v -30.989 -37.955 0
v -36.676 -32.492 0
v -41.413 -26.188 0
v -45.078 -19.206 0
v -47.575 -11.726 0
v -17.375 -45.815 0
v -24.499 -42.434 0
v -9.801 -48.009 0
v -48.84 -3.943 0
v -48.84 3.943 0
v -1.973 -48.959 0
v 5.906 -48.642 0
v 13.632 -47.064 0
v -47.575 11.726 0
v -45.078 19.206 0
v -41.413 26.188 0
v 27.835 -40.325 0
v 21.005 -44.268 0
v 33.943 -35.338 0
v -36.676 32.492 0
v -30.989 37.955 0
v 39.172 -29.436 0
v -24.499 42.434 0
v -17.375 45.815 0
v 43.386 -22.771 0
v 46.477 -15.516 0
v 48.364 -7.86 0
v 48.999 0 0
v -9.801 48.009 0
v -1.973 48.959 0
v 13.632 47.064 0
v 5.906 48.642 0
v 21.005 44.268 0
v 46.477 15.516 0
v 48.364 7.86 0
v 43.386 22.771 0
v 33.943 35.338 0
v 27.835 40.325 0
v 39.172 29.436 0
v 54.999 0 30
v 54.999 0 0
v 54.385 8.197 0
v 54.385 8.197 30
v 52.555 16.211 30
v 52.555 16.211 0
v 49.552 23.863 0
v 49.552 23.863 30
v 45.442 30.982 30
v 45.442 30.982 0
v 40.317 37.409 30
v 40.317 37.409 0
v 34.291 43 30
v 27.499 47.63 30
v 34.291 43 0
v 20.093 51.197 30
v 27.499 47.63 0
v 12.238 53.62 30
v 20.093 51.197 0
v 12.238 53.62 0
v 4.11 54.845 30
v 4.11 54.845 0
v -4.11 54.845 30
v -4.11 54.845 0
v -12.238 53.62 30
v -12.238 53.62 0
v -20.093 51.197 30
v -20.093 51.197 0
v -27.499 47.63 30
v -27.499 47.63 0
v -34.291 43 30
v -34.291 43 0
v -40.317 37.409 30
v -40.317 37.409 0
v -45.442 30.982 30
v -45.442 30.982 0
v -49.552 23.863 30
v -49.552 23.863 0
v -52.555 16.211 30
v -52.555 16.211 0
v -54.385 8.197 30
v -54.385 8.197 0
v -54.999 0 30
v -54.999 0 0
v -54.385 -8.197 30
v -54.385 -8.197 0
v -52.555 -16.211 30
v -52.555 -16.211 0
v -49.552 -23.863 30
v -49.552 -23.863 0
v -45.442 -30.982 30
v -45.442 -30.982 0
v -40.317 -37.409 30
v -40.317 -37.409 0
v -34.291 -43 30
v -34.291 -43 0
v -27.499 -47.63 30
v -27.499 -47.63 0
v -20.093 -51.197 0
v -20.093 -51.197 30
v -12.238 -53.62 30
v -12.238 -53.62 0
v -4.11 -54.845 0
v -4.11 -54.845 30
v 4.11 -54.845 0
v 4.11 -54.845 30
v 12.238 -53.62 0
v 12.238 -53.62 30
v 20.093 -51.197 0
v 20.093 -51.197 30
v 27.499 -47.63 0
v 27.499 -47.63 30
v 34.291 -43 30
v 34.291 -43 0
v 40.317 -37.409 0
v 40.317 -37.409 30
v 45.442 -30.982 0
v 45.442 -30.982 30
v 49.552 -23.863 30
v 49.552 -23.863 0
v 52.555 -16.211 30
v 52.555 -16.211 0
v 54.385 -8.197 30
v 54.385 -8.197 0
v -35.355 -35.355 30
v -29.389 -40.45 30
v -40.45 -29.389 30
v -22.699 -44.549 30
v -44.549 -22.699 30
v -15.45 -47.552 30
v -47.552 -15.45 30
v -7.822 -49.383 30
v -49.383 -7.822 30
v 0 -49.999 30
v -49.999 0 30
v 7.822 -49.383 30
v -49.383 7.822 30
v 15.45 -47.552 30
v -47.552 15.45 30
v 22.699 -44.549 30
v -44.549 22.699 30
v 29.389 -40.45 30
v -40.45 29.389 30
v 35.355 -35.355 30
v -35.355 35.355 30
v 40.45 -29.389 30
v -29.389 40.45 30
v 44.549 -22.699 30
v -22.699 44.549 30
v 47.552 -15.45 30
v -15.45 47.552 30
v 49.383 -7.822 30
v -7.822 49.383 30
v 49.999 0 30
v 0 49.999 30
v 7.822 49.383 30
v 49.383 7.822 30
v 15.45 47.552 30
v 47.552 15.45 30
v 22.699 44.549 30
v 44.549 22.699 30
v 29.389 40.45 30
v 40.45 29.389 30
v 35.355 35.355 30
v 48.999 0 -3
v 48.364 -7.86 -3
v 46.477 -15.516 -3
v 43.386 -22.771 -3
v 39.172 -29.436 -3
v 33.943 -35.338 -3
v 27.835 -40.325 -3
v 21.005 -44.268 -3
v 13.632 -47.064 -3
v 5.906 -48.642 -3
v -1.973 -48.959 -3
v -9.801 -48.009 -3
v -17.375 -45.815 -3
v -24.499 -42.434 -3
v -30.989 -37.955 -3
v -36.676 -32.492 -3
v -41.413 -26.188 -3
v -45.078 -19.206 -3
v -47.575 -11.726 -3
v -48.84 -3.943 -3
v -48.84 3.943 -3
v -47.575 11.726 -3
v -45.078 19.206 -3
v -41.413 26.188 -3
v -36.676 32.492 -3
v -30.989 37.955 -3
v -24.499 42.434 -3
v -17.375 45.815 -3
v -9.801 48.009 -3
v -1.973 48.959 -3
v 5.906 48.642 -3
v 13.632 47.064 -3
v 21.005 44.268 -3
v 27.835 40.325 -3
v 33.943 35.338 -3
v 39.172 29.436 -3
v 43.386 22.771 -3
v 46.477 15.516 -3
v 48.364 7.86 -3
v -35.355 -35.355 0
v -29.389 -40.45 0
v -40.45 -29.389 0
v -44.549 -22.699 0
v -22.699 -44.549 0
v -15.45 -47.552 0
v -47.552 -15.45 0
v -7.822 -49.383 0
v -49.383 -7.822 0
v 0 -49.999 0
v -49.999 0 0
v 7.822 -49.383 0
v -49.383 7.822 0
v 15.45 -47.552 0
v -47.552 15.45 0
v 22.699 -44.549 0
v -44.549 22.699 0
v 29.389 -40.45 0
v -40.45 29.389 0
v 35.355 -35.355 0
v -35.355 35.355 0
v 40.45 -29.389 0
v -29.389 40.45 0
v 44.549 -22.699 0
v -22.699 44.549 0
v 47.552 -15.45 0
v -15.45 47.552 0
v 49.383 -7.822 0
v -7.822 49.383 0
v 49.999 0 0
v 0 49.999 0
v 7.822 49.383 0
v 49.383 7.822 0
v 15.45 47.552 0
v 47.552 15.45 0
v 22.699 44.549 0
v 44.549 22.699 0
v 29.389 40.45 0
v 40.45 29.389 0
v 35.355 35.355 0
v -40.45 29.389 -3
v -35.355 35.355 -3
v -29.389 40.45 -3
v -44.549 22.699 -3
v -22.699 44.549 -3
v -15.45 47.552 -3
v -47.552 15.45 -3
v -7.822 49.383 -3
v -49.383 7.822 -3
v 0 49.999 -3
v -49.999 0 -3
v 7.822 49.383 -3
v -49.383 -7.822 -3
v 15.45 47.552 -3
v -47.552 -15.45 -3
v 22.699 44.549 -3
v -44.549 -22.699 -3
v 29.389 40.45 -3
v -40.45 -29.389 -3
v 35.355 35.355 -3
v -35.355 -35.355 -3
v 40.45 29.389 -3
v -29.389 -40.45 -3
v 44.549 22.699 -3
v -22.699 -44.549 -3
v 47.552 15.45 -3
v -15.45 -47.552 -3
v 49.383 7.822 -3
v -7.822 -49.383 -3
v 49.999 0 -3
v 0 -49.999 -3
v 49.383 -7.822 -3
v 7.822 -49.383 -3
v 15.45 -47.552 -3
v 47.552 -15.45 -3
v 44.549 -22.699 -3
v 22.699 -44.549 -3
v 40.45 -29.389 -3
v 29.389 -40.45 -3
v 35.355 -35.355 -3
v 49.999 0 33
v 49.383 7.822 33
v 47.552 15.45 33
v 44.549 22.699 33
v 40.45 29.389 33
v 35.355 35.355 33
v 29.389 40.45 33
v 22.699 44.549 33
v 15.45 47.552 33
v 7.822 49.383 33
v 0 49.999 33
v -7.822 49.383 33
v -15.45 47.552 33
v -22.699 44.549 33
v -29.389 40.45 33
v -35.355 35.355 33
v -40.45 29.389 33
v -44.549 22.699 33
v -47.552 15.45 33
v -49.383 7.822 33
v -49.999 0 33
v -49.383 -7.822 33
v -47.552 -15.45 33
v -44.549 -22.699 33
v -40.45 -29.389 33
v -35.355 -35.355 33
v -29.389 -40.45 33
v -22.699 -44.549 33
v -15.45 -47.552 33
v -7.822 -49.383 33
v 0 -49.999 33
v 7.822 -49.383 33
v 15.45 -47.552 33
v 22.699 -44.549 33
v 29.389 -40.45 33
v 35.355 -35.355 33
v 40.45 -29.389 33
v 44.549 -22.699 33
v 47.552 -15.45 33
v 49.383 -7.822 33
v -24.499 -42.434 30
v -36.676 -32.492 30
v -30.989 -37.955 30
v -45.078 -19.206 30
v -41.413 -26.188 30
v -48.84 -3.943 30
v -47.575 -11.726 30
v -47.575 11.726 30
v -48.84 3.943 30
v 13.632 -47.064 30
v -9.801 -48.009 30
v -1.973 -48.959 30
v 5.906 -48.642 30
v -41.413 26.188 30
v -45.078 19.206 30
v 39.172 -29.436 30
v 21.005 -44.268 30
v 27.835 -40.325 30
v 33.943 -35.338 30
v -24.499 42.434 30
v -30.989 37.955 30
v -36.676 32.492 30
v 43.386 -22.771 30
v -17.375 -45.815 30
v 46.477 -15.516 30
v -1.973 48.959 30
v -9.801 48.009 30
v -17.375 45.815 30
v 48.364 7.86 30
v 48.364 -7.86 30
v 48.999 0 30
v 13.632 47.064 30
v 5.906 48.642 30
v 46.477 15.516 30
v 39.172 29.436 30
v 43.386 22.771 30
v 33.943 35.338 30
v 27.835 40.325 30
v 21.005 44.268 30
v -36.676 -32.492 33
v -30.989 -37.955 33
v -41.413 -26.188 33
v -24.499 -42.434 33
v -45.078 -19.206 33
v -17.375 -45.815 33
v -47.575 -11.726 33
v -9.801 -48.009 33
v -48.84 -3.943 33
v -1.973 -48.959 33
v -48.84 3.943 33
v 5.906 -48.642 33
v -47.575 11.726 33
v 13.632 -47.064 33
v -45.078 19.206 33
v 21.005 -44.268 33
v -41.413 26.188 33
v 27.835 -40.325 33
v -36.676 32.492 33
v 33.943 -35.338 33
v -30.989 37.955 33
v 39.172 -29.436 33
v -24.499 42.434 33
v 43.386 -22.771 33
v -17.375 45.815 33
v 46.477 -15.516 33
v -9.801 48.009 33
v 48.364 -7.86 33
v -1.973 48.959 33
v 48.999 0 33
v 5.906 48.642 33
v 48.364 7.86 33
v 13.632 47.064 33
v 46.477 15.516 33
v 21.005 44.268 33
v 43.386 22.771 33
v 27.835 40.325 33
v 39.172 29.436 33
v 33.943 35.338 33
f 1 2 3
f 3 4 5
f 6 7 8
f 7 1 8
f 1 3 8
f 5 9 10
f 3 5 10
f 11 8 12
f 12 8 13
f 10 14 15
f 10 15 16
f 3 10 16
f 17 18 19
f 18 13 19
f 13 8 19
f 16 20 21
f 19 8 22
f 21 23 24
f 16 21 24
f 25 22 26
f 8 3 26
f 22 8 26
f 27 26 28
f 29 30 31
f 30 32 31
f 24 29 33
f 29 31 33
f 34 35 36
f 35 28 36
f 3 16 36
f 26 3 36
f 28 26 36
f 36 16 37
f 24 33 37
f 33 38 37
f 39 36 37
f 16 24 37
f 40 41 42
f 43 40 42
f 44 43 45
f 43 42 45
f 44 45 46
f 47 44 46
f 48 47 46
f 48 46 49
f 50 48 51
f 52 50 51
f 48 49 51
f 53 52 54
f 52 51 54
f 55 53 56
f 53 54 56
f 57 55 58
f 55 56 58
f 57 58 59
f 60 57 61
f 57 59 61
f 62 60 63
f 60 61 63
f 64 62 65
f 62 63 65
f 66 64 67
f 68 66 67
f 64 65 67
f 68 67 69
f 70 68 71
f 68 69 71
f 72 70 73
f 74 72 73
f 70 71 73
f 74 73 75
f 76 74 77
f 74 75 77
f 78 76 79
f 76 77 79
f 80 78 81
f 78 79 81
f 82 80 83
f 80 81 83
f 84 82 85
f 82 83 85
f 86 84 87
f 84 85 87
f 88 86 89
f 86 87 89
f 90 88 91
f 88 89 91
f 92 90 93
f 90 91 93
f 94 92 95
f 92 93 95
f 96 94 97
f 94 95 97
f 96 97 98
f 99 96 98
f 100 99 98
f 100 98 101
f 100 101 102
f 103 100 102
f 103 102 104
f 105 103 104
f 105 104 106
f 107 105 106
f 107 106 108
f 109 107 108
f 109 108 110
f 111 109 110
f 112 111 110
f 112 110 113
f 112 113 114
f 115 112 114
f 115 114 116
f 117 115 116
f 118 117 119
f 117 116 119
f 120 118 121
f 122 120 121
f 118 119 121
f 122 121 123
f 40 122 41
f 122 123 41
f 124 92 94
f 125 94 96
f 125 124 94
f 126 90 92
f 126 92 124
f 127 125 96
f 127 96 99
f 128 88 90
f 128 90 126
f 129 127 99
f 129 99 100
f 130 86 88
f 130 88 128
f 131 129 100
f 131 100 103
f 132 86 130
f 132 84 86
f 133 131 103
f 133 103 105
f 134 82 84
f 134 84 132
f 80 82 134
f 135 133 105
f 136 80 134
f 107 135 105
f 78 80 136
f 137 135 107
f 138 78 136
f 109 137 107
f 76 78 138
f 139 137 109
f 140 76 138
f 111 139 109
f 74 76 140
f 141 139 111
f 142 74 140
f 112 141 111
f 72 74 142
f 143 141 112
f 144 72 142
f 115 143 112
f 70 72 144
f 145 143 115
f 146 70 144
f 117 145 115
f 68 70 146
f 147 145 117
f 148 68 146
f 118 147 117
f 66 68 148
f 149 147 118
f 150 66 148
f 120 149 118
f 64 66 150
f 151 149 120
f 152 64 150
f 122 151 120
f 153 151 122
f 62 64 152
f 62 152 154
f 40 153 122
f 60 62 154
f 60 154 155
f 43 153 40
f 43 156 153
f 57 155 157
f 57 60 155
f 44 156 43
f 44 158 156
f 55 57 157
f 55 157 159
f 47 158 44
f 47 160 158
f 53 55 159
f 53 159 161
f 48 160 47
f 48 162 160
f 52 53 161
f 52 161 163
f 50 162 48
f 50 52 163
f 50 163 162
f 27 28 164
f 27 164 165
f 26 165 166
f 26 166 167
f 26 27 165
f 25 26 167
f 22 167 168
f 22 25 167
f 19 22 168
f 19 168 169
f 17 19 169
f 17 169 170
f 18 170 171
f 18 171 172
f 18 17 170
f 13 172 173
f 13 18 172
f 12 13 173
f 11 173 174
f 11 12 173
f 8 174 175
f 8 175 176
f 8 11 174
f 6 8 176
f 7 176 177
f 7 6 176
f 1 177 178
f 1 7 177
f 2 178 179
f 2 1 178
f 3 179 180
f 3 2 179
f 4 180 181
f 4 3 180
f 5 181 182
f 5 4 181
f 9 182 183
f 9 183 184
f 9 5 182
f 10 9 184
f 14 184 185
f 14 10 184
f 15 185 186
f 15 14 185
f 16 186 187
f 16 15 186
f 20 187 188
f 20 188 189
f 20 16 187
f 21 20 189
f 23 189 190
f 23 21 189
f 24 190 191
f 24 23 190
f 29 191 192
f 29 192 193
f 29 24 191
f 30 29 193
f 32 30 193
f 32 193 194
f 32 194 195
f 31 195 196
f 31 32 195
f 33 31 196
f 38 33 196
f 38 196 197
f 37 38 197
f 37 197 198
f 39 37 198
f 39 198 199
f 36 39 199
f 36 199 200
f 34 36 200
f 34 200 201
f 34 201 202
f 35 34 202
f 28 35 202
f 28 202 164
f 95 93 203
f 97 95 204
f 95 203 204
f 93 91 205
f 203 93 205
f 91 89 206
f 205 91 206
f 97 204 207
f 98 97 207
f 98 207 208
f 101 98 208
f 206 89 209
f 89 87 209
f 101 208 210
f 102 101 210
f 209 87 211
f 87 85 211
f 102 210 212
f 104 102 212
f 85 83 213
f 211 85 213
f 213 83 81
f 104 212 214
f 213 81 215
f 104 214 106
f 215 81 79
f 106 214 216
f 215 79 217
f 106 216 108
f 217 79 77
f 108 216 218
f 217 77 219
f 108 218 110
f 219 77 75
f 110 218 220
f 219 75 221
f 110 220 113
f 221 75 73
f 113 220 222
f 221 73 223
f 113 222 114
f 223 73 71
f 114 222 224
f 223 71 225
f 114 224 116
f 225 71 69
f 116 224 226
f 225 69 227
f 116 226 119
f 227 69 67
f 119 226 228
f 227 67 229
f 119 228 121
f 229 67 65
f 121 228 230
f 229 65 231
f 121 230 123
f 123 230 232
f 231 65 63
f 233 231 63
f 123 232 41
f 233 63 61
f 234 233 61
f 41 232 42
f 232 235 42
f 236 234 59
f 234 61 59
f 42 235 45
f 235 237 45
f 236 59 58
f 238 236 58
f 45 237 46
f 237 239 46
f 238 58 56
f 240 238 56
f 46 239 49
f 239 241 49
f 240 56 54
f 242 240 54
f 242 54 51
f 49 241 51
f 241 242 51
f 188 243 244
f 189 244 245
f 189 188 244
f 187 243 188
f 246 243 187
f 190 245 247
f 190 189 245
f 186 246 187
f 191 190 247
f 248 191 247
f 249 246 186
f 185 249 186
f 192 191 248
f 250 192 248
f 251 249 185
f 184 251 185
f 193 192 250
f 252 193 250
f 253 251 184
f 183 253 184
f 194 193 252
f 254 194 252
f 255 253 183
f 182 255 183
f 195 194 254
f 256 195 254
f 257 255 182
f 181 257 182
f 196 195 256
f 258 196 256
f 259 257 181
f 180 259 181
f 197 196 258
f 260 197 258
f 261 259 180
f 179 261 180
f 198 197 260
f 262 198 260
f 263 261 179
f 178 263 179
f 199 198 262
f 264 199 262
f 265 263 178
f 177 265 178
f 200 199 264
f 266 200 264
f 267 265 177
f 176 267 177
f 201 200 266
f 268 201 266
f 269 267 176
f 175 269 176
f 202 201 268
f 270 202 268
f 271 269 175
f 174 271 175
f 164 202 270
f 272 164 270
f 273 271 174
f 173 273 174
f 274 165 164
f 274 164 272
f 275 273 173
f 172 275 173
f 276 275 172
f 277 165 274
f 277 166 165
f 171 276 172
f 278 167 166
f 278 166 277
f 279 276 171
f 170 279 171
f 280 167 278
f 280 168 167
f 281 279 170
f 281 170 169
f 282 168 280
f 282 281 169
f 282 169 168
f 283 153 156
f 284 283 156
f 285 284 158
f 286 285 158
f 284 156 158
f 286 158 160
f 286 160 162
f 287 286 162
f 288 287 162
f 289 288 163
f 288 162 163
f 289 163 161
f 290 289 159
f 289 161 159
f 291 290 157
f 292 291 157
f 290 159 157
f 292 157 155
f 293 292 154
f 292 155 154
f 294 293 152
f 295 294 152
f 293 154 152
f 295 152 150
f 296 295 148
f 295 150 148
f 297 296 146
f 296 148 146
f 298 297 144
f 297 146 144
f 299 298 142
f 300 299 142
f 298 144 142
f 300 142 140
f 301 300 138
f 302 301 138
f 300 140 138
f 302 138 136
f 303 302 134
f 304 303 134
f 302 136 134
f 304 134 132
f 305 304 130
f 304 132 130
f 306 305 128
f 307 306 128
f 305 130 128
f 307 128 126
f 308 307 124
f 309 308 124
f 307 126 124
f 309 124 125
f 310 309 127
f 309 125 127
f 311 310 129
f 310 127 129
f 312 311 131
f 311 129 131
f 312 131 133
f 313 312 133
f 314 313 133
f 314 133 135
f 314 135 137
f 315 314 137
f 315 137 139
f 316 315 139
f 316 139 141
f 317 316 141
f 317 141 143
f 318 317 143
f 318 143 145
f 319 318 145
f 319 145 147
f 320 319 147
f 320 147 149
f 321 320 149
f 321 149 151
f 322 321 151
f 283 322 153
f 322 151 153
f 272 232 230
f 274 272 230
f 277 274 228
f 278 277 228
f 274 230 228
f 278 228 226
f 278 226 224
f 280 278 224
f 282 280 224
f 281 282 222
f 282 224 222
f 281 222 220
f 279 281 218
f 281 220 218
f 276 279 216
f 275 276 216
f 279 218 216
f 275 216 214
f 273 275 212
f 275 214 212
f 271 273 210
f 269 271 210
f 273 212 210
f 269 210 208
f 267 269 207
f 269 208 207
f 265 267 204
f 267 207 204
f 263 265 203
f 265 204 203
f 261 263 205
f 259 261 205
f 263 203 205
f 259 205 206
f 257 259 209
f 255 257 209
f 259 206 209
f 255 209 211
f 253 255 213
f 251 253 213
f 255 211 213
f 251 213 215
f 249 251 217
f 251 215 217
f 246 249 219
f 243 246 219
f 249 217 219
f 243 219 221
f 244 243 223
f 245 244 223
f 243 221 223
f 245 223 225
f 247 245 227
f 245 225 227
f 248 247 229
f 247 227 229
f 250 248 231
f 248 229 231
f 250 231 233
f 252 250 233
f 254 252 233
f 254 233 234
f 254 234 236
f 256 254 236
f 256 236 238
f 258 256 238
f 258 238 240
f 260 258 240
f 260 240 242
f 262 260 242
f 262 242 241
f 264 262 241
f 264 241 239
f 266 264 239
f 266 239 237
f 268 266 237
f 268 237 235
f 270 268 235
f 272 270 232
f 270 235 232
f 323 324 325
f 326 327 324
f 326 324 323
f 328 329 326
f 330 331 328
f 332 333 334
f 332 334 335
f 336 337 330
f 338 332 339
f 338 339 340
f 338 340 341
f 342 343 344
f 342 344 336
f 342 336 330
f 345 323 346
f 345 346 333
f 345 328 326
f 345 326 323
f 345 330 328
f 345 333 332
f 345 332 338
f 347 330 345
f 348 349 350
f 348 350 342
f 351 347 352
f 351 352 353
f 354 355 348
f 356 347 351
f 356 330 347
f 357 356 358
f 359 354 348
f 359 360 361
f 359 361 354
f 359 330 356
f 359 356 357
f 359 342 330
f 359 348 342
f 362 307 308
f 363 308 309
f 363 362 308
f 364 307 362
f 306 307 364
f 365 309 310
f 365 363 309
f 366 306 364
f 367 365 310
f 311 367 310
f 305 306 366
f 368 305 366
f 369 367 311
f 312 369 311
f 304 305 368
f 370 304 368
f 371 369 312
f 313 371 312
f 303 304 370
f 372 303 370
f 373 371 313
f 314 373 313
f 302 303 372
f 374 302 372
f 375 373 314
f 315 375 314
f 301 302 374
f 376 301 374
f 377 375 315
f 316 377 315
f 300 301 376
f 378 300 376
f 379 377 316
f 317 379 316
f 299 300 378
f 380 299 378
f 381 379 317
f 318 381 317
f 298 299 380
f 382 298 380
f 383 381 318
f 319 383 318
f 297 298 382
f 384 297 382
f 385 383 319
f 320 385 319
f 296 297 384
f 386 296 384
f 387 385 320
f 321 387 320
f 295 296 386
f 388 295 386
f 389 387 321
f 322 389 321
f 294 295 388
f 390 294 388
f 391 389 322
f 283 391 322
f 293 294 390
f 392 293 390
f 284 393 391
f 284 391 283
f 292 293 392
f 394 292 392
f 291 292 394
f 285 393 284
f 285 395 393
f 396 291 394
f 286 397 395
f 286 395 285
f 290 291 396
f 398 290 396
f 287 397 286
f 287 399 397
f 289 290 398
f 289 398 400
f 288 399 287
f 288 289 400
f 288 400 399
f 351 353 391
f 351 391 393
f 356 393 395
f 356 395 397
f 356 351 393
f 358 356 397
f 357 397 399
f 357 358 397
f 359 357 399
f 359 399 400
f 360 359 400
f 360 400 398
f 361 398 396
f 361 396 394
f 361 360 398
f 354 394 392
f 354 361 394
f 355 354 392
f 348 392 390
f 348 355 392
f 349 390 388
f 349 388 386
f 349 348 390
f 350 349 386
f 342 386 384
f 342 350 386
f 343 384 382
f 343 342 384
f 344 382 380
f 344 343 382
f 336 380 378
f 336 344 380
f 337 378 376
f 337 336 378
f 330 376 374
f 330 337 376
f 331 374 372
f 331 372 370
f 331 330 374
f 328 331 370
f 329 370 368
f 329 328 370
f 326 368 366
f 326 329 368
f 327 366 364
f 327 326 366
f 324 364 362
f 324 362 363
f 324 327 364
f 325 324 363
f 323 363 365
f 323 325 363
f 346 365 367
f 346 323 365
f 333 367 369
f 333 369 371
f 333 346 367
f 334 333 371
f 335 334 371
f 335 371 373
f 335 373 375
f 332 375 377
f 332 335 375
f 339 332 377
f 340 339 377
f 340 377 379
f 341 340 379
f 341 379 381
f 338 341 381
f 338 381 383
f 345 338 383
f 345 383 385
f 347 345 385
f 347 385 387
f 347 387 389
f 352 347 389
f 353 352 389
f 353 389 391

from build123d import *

# Parameters (mm, degrees)
F0_R     = 54.998868
F1_DEPTH = 30
F2_R     = 49.998868
F2_R_2   = 48.998866
F3_DEPTH = 3
F4_R     = 49.998868
F4_R_2   = 48.998866
F5_DEPTH = 3


with BuildPart() as f1:
    # F0 (on Top) → F1 (new body)
    with BuildSketch(Plane.XY):
        Circle(F0_R)
    extrude(amount=F1_DEPTH)

    # F2 (on face) → F3 (join)
    with BuildSketch(Plane(origin=(0, 0, 0), x_dir=(1, 0, 0), z_dir=(0, 0, -1))):
        Circle(F2_R)
        Circle(F2_R_2, mode=Mode.SUBTRACT)
    extrude(amount=F3_DEPTH)

    # F4 (on face) → F5 (join)
    with BuildSketch(Plane.XY.offset(30)):
        Circle(F4_R)
        Circle(F4_R_2, mode=Mode.SUBTRACT)
    extrude(amount=F5_DEPTH)


solid = f1.part
